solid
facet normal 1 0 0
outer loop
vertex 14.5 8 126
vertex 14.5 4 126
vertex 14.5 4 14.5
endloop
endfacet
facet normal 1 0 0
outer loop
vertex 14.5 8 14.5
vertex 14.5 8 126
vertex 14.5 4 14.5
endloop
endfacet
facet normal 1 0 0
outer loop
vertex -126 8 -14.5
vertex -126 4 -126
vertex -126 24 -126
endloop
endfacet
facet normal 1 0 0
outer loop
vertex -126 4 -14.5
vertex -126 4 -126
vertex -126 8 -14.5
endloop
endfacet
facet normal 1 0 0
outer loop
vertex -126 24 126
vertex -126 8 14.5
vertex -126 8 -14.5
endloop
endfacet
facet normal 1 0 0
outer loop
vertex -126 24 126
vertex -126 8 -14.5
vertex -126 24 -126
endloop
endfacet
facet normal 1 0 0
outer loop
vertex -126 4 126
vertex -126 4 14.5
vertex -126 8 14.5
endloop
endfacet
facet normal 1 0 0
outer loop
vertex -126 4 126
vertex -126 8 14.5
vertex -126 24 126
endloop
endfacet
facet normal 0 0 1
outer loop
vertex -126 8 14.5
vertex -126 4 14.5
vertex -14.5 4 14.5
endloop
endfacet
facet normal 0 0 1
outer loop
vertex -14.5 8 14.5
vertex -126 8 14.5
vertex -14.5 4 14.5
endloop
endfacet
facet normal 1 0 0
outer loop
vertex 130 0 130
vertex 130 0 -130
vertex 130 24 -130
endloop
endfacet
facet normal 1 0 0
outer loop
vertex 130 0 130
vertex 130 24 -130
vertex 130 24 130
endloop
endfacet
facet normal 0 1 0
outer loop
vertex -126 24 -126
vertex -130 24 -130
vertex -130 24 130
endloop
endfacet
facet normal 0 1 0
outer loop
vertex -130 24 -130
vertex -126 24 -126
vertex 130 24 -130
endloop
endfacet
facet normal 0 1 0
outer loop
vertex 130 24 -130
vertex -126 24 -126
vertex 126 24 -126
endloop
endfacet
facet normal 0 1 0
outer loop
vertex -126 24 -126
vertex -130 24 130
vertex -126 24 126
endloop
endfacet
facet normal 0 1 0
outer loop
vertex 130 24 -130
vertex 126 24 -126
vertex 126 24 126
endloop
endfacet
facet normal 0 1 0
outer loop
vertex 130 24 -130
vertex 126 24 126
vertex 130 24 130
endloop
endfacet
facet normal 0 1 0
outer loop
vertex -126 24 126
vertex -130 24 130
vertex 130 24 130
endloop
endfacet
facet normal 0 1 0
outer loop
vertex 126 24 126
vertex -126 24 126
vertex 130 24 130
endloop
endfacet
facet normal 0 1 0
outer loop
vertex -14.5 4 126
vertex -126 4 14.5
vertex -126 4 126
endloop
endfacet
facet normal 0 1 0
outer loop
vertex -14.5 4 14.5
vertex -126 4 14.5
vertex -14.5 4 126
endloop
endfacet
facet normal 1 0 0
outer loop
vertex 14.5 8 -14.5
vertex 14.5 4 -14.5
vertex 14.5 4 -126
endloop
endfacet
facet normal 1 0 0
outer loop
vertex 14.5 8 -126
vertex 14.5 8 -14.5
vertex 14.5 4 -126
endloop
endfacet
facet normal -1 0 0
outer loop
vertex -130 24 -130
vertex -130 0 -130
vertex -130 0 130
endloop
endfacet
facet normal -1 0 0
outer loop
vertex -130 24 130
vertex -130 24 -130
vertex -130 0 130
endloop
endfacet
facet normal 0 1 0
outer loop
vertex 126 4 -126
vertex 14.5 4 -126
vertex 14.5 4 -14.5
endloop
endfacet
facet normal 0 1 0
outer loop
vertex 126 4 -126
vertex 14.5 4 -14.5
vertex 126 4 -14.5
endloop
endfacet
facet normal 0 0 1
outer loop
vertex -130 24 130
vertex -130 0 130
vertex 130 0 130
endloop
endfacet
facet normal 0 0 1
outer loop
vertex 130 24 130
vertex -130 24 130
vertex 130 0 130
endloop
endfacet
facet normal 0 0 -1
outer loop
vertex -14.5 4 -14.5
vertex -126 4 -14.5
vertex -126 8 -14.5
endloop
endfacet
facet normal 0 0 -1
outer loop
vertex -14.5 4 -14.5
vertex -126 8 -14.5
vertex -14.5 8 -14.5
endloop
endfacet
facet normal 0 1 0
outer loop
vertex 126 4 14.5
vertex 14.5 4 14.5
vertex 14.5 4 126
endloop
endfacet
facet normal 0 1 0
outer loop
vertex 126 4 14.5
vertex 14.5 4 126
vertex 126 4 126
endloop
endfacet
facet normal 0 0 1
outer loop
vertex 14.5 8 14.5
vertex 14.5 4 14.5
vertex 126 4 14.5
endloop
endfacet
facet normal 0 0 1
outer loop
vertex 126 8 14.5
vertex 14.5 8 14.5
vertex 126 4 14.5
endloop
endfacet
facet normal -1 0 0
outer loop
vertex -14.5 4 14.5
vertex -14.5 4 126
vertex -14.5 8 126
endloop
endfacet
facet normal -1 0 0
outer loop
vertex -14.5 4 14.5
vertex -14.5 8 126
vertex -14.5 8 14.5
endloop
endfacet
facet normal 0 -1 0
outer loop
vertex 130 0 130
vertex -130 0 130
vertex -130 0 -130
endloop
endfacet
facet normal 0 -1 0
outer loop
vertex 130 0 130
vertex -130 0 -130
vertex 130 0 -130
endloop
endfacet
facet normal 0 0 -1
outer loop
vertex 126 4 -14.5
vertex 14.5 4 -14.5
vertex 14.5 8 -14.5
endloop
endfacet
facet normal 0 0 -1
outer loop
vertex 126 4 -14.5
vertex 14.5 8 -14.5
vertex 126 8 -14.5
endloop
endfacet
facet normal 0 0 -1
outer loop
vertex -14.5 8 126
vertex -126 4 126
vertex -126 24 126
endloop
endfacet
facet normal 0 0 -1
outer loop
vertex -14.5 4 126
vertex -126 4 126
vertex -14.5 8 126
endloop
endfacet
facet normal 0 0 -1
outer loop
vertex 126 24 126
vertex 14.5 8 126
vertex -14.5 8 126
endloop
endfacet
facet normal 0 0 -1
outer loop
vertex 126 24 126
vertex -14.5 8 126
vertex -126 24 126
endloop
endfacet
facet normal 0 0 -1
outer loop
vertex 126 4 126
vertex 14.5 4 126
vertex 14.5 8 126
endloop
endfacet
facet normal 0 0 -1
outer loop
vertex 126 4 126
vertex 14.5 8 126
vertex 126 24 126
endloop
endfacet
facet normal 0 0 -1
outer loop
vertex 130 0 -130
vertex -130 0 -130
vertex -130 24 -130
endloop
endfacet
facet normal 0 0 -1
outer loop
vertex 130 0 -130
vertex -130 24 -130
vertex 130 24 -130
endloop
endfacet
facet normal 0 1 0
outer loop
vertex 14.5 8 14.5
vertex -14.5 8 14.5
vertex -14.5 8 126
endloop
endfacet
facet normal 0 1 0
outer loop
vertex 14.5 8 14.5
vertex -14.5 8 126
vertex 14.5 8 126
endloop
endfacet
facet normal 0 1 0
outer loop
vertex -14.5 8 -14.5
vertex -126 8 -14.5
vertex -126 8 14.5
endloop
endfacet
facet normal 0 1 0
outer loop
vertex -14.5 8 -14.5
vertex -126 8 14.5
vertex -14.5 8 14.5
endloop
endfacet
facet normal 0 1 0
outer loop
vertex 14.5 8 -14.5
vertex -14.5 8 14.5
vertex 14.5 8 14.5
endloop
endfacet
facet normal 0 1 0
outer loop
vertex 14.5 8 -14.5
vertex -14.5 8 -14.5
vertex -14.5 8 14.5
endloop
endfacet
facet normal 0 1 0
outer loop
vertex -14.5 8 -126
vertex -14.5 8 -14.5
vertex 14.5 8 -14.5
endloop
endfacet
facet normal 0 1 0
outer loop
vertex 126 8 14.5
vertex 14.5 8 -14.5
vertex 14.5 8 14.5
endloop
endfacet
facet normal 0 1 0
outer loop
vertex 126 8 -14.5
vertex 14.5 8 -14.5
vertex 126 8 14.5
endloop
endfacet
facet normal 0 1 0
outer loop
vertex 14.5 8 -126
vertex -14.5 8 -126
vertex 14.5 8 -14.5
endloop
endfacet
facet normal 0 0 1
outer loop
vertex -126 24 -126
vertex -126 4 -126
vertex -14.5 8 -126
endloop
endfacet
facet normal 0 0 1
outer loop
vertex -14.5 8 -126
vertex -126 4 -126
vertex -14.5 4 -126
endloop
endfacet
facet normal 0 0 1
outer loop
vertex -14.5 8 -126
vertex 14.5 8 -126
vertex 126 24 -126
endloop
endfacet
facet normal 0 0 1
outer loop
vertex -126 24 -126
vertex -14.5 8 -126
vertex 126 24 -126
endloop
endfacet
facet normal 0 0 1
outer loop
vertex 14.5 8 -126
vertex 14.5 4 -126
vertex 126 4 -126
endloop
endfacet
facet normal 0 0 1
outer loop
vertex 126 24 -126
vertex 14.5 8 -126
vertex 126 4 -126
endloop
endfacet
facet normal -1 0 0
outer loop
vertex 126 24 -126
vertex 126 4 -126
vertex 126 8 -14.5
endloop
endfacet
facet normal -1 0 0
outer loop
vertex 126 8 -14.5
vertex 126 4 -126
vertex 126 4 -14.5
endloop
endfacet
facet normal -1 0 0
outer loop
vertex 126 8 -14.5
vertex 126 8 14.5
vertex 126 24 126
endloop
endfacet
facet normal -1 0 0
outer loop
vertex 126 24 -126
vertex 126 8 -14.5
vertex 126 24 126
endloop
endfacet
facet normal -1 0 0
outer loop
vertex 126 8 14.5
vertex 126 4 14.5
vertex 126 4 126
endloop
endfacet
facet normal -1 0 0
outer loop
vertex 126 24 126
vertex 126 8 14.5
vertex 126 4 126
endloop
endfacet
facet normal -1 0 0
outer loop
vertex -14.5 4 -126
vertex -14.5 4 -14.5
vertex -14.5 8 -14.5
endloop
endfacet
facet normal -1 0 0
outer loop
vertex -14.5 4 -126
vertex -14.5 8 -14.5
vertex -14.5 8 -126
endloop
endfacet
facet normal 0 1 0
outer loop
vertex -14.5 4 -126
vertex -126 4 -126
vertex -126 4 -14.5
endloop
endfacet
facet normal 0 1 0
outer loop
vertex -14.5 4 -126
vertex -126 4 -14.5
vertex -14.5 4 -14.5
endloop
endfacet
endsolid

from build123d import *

# Parameters (mm, degrees)
SKETCH1_W           = 252
SKETCH1_H           = 252
BOSS_EXTRUDE1_DEPTH = 4
SKETCH2_W           = 252
SKETCH2_H           = 29
SKETCH2_W_2         = 29
SKETCH2_H_2         = 252
BOSS_EXTRUDE2_DEPTH = 4
SKETCH3_W           = 260
SKETCH3_H           = 260
SKETCH3_W_2         = 252
SKETCH3_H_2         = 252
BOSS_EXTRUDE3_DEPTH = 24


with BuildPart() as part:
    # Sketch1 → Boss-Extrude1 (new body)
    with BuildSketch(Plane(origin=(0, 0, 0), x_dir=(1, 0, 0), z_dir=(0, 1, 0))):
        Rectangle(SKETCH1_W, SKETCH1_H)
    extrude(amount=BOSS_EXTRUDE1_DEPTH)

    # Sketch2 → Boss-Extrude2 (add)
    with BuildSketch(Plane(origin=(0, 4, 0), x_dir=(1, 0, 0), z_dir=(0, 1, 0))):
        Rectangle(SKETCH2_W, SKETCH2_H)
        Rectangle(SKETCH2_W_2, SKETCH2_H_2)
    extrude(amount=BOSS_EXTRUDE2_DEPTH)

    # Sketch3 → Boss-Extrude3 (add)
    with BuildSketch(Plane.XZ):
        Rectangle(SKETCH3_W, SKETCH3_H)
        Rectangle(SKETCH3_W_2, SKETCH3_H_2, mode=Mode.SUBTRACT)
    extrude(amount=-BOSS_EXTRUDE3_DEPTH)


solid = part.part
